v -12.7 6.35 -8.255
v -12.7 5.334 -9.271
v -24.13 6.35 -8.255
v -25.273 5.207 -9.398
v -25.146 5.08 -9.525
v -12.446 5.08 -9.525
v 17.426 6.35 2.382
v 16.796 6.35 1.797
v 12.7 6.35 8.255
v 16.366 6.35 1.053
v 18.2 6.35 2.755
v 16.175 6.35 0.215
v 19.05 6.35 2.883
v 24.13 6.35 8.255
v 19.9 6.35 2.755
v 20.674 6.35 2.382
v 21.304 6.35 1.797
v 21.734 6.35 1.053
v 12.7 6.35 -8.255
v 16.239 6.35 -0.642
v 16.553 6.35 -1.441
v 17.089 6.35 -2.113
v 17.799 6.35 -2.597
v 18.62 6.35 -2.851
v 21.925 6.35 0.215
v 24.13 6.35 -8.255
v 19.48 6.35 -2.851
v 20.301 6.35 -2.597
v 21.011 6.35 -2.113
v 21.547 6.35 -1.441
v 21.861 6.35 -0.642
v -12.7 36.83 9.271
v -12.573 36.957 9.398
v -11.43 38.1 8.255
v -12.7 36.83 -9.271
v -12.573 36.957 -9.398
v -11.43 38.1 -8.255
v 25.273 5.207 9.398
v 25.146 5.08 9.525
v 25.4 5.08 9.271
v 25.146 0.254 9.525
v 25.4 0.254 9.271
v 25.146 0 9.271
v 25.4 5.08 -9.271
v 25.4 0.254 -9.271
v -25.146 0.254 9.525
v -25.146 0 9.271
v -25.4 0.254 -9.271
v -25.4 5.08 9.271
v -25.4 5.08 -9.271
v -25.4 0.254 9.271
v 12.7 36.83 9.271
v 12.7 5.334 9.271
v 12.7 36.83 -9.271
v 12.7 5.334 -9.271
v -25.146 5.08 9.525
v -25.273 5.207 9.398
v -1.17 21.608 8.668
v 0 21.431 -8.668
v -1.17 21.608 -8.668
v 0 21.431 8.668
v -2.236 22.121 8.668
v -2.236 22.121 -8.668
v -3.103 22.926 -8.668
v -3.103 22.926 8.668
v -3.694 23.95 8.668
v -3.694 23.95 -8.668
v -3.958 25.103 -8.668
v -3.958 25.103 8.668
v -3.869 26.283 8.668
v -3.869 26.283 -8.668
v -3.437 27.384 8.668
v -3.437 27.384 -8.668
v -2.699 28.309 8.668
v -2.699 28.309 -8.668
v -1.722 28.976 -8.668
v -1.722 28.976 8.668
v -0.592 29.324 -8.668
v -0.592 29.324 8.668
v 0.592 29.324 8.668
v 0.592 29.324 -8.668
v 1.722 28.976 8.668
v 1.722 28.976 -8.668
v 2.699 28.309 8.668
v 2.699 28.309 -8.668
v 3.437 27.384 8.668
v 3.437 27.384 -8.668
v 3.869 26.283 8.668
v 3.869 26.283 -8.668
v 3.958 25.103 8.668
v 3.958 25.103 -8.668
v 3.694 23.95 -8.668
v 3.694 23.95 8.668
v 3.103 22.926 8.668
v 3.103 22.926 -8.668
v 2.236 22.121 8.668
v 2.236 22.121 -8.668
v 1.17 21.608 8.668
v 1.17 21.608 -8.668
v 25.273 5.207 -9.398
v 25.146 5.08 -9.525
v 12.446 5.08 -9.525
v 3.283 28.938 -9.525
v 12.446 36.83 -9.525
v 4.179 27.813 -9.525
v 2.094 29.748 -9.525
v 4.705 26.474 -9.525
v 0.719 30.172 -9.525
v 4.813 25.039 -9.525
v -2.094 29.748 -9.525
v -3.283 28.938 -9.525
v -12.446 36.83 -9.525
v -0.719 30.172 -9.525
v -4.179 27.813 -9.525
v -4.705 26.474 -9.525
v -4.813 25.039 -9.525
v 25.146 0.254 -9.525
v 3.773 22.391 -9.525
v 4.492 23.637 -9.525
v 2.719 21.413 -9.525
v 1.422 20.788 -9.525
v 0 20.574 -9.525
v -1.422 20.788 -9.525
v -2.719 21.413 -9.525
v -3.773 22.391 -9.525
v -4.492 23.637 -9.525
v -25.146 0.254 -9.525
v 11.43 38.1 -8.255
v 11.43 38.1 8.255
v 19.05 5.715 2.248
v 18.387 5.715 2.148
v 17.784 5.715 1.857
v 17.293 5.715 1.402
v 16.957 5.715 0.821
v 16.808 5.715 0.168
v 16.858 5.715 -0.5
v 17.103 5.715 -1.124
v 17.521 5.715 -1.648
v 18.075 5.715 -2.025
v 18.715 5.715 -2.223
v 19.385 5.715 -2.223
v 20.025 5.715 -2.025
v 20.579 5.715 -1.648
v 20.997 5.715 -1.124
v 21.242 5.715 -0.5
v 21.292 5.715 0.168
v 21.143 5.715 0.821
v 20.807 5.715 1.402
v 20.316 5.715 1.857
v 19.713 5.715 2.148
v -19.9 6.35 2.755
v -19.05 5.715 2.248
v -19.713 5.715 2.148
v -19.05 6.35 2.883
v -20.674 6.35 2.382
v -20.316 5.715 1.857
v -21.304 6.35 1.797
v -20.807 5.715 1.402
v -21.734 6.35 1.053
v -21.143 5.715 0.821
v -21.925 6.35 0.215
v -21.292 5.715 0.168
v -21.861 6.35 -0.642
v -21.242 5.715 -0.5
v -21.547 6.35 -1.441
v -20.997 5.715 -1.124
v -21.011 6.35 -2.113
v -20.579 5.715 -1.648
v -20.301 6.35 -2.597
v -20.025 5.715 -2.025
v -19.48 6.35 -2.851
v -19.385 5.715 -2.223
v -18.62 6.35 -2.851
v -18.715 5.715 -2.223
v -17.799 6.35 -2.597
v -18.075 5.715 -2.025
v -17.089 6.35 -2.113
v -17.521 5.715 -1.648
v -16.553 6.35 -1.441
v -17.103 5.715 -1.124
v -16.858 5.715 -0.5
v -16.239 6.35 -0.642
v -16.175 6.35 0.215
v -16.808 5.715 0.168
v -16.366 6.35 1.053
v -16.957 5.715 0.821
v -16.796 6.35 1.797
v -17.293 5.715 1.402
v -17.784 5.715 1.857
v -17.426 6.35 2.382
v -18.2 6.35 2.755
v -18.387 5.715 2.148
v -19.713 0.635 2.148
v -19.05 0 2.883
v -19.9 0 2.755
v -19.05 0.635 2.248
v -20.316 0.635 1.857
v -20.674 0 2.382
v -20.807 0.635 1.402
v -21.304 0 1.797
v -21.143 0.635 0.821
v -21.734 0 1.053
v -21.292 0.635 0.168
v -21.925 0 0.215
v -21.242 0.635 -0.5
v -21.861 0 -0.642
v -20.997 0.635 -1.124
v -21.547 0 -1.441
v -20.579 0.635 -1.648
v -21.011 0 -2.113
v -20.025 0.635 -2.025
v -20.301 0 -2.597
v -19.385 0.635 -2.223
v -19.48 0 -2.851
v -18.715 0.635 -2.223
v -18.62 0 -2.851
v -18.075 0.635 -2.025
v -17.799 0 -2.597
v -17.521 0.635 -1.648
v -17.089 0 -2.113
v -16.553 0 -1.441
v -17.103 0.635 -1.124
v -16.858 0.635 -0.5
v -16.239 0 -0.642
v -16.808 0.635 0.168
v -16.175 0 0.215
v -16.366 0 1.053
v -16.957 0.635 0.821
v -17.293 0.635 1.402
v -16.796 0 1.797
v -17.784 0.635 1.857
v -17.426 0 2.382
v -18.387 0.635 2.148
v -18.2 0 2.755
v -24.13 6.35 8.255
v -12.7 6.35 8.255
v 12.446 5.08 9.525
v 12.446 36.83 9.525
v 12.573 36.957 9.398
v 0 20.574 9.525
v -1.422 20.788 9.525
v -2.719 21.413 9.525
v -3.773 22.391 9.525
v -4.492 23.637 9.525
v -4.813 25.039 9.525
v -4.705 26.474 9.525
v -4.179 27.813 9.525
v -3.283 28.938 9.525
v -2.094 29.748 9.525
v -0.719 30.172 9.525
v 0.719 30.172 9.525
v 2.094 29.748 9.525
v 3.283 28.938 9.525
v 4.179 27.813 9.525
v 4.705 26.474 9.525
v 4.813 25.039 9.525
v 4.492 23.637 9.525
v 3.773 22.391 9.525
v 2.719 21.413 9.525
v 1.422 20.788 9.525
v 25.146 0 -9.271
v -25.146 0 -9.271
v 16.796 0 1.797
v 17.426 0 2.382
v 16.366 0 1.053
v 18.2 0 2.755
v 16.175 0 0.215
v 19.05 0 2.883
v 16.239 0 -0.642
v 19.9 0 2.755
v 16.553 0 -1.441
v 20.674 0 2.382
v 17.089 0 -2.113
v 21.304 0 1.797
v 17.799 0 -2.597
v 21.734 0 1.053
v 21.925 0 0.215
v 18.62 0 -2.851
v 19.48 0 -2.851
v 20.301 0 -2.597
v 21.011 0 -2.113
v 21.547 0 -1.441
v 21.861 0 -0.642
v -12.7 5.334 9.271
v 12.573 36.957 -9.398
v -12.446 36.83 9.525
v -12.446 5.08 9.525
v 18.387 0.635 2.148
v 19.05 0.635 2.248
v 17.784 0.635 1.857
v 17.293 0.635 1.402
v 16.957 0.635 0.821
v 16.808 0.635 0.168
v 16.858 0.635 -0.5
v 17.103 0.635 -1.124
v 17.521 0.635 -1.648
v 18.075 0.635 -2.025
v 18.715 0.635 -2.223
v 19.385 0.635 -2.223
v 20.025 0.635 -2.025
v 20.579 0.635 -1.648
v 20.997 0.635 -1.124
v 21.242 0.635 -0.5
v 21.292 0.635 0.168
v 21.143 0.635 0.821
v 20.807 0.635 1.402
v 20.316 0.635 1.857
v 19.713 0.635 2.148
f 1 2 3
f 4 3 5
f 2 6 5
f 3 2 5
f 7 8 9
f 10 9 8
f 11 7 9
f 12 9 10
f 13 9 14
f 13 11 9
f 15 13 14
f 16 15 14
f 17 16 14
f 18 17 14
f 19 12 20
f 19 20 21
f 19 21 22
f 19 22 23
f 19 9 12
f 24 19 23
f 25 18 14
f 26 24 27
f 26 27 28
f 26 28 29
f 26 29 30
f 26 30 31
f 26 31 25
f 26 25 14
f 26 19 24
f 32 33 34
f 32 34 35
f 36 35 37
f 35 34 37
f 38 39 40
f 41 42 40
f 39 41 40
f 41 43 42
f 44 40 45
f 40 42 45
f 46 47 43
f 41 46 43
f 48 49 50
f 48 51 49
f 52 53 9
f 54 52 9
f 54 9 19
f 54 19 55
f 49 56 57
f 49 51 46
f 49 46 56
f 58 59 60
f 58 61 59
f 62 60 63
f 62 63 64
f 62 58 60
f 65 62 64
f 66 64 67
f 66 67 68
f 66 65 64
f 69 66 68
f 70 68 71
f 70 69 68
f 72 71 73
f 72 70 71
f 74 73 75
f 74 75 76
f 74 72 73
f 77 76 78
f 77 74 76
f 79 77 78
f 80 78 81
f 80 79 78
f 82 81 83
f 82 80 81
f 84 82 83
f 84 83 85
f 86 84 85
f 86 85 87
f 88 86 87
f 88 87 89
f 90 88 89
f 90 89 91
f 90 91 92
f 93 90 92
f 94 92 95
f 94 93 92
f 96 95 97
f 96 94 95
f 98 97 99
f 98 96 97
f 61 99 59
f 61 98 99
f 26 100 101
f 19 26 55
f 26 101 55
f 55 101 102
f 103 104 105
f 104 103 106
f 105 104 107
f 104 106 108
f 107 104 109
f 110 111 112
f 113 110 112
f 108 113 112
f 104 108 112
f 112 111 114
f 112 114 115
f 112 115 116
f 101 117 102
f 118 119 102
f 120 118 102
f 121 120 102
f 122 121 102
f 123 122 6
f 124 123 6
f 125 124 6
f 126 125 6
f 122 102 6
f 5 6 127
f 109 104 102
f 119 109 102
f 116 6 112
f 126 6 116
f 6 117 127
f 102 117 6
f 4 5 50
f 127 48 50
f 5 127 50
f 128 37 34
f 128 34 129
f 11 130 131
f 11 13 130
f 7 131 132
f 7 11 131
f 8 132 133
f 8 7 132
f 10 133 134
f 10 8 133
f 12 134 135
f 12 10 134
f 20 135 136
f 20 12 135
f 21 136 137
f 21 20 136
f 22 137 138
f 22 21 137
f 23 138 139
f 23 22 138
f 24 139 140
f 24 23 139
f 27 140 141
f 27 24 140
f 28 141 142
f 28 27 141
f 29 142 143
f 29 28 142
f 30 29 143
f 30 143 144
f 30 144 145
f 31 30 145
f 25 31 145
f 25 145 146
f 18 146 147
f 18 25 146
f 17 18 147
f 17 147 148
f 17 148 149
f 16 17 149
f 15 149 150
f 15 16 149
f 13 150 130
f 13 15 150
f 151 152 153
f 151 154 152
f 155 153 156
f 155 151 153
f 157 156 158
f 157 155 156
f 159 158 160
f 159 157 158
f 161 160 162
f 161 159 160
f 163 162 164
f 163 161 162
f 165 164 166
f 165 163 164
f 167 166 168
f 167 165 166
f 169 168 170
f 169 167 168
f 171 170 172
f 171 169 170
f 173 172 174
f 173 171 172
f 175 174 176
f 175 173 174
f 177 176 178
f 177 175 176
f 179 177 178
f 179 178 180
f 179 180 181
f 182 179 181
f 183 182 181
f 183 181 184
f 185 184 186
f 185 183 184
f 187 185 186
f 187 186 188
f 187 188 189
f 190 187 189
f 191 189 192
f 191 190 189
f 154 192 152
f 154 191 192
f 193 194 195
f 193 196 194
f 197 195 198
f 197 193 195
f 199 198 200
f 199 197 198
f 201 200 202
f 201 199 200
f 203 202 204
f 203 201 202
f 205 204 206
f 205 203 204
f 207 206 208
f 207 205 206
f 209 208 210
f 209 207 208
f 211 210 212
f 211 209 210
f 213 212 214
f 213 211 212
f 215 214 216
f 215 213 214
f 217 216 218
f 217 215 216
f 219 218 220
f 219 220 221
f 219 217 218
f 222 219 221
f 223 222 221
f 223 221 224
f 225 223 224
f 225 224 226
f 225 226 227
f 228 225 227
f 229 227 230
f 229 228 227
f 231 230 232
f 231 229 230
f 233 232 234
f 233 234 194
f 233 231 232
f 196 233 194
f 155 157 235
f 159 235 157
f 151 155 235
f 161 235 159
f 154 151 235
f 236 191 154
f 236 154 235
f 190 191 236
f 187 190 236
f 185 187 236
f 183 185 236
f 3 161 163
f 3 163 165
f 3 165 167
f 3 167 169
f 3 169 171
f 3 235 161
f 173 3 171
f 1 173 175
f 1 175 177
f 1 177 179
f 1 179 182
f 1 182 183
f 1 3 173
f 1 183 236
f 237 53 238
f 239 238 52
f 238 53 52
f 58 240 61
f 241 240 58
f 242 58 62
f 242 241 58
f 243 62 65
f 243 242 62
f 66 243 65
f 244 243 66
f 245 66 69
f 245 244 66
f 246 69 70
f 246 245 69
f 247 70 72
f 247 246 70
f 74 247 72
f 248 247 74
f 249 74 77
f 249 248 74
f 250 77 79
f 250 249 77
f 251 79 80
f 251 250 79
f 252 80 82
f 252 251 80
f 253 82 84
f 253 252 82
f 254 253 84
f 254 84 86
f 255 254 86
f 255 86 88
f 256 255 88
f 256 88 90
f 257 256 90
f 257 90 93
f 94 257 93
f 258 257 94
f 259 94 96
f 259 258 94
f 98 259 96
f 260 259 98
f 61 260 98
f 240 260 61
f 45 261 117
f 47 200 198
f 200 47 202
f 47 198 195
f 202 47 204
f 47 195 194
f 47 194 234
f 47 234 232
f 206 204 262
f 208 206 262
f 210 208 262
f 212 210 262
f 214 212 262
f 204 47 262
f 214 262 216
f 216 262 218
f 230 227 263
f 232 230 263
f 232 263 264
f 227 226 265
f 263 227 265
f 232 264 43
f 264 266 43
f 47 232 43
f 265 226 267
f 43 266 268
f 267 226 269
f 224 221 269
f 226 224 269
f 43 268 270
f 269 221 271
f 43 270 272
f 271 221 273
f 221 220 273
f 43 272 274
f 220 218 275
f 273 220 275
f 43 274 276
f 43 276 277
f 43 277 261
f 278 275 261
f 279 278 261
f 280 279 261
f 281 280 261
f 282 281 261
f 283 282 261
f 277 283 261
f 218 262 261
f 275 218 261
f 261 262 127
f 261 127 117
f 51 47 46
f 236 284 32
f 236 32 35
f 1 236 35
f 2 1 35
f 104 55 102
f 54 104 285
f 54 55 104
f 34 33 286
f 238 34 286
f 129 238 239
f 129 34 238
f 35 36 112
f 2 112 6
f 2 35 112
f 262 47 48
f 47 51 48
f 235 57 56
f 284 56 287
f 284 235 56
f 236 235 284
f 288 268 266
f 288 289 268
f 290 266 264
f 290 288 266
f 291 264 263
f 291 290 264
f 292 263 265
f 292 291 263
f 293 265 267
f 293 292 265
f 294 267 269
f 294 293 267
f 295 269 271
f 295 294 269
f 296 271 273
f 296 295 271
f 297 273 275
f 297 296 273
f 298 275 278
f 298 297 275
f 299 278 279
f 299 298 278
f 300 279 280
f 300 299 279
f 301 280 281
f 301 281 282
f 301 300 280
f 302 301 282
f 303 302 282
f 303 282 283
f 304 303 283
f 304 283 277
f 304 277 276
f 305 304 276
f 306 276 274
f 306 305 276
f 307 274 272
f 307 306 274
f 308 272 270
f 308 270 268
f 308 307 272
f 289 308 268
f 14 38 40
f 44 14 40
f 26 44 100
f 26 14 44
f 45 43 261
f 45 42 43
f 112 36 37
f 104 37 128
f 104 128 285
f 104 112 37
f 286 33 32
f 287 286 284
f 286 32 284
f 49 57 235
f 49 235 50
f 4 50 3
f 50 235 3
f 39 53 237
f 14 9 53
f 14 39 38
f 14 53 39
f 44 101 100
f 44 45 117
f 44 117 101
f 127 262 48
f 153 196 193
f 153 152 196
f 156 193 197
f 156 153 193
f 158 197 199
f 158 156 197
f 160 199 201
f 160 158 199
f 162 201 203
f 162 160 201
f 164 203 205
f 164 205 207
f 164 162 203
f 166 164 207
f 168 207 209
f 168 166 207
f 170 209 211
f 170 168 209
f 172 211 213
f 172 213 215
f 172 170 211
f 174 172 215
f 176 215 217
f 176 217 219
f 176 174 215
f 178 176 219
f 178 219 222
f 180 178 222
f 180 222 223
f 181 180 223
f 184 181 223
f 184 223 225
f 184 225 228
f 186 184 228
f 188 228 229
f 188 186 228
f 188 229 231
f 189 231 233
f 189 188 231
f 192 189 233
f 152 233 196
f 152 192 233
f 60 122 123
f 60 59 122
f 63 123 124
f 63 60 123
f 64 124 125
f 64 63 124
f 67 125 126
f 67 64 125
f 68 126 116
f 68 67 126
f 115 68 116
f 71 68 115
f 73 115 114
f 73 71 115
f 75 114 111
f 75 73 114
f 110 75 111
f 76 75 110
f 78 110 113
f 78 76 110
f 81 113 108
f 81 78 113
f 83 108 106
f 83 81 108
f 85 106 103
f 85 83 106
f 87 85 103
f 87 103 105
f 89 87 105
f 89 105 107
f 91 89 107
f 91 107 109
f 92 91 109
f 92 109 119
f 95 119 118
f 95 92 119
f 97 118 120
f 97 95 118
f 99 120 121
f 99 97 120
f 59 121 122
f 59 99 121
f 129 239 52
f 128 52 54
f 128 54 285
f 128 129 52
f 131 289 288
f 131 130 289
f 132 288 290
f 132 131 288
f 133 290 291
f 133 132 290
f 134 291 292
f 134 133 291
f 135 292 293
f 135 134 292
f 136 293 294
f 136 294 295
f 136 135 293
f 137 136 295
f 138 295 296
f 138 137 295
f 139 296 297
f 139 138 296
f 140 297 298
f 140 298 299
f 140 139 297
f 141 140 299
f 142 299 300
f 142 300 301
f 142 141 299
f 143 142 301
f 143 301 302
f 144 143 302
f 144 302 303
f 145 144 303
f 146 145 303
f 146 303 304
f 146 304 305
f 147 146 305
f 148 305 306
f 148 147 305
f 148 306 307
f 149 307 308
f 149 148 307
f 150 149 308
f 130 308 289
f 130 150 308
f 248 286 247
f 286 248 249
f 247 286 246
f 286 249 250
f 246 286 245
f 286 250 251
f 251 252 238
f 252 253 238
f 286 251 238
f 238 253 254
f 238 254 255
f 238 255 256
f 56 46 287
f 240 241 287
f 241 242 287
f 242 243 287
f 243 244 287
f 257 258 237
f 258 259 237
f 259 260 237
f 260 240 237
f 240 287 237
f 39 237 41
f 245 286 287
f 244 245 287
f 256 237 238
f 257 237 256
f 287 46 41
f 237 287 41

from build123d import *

# Parameters (mm, degrees)
SKETCH1_W                      = 50.8
SKETCH1_H                      = 19.05
BOSS_EXTRUDE1_DEPTH            = 6.35
SKETCH1_3_W                    = 25.4
SKETCH1_3_H                    = 19.05
BOSS_EXTRUDE2_DEPTH            = 38.1
F_8_CLEARANCE_HOLE1_AT_2_COUNT = 2
F_8_CLEARANCE_HOLE1_AT_2_PITCH = 38.1
CHAMFER1_SIZE                  = 1.27
CHAMFER2_SIZE                  = 0.254


with BuildPart() as part:
    # Sketch1 → Boss-Extrude1 (new body)
    with BuildSketch(Plane(origin=(0, 0, 0), x_dir=(1, 0, 0), z_dir=(0, 1, 0))):
        Rectangle(SKETCH1_W, SKETCH1_H)
    extrude(amount=BOSS_EXTRUDE1_DEPTH)

    # Sketch1<3> → Boss-Extrude2 (add)
    with BuildSketch(Plane(origin=(0, 0, 0), x_dir=(1, 0, 0), z_dir=(0, 1, 0))):
        Rectangle(SKETCH1_3_W, SKETCH1_3_H)
    extrude(amount=BOSS_EXTRUDE2_DEPTH)

    # Sketch4 → 3/8-16 Tapped Hole1 (revolve, cut)
    with BuildSketch(Plane(origin=(0, 25.4, 9.525), x_dir=(0, -1, 0), z_dir=(1, 0, 0))):
        Polygon((0, 0), (0, 19.05), (4.826, 19.05), (3.96875, 18.19275), (3.96875, 0.85725), (4.826, 0), align=None)
    revolve(axis=Axis((0, 25.4, 15.875), (0, 0, -1)), mode=Mode.SUBTRACT)

    # Sketch8 → #8 Clearance Hole1 (revolve, cut)
    with BuildSketch(Plane(origin=(-19.05, 6.35, 0), x_dir=(0, 0, 1), z_dir=(1, 0, 0))):
        Polygon((0, 0), (0, 6.35), (2.8829, 6.35), (2.2479, 5.715), (2.2479, 0.635), (2.8829, 0), align=None)
    f_8_clearance_hole1 = revolve(axis=Axis((-19.05, 12.7, 0), (0, -1, 0)), mode=Mode.SUBTRACT)

    # #8 Clearance Hole1 at 2: #8 Clearance Hole1 ×2
    with Locations(*[(i * F_8_CLEARANCE_HOLE1_AT_2_PITCH, 0, 0) for i in range(1, F_8_CLEARANCE_HOLE1_AT_2_COUNT)]):
        add(f_8_clearance_hole1, mode=Mode.SUBTRACT)

    # Chamfer1
    chamfer1_edges = [part.edges().sort_by_distance(p)[0] for p in [
        (-12.7, 38.1, 0),
        (0, 38.1, -9.525),
        (12.7, 38.1, 0),
        (0, 38.1, 9.525),
        (19.05, 6.35, -9.525),
        (25.4, 6.35, 0),
        (19.05, 6.35, 9.525),
        (-19.05, 6.35, -9.525),
        (-19.05, 6.35, 9.525),
        (-25.4, 6.35, 0),
    ]]
    chamfer(chamfer1_edges, length=CHAMFER1_SIZE)

    # Chamfer2
    chamfer2_edges = [part.edges().sort_by_distance(p)[0] for p in [
        (25.4, 2.54, -9.525),
        (25.4, 2.54, 9.525),
        (-25.4, 2.54, -9.525),
        (-25.4, 2.54, 9.525),
        (-25.4, 0, 0),
        (0, 0, -9.525),
        (25.4, 0, 0),
        (0, 0, 9.525),
        (12.7, 20.955, -9.525),
        (12.7, 20.955, 9.525),
        (-12.7, 20.955, 9.525),
        (-12.7, 20.955, -9.525),
    ]]
    chamfer(chamfer2_edges, length=CHAMFER2_SIZE)


solid = part.part
